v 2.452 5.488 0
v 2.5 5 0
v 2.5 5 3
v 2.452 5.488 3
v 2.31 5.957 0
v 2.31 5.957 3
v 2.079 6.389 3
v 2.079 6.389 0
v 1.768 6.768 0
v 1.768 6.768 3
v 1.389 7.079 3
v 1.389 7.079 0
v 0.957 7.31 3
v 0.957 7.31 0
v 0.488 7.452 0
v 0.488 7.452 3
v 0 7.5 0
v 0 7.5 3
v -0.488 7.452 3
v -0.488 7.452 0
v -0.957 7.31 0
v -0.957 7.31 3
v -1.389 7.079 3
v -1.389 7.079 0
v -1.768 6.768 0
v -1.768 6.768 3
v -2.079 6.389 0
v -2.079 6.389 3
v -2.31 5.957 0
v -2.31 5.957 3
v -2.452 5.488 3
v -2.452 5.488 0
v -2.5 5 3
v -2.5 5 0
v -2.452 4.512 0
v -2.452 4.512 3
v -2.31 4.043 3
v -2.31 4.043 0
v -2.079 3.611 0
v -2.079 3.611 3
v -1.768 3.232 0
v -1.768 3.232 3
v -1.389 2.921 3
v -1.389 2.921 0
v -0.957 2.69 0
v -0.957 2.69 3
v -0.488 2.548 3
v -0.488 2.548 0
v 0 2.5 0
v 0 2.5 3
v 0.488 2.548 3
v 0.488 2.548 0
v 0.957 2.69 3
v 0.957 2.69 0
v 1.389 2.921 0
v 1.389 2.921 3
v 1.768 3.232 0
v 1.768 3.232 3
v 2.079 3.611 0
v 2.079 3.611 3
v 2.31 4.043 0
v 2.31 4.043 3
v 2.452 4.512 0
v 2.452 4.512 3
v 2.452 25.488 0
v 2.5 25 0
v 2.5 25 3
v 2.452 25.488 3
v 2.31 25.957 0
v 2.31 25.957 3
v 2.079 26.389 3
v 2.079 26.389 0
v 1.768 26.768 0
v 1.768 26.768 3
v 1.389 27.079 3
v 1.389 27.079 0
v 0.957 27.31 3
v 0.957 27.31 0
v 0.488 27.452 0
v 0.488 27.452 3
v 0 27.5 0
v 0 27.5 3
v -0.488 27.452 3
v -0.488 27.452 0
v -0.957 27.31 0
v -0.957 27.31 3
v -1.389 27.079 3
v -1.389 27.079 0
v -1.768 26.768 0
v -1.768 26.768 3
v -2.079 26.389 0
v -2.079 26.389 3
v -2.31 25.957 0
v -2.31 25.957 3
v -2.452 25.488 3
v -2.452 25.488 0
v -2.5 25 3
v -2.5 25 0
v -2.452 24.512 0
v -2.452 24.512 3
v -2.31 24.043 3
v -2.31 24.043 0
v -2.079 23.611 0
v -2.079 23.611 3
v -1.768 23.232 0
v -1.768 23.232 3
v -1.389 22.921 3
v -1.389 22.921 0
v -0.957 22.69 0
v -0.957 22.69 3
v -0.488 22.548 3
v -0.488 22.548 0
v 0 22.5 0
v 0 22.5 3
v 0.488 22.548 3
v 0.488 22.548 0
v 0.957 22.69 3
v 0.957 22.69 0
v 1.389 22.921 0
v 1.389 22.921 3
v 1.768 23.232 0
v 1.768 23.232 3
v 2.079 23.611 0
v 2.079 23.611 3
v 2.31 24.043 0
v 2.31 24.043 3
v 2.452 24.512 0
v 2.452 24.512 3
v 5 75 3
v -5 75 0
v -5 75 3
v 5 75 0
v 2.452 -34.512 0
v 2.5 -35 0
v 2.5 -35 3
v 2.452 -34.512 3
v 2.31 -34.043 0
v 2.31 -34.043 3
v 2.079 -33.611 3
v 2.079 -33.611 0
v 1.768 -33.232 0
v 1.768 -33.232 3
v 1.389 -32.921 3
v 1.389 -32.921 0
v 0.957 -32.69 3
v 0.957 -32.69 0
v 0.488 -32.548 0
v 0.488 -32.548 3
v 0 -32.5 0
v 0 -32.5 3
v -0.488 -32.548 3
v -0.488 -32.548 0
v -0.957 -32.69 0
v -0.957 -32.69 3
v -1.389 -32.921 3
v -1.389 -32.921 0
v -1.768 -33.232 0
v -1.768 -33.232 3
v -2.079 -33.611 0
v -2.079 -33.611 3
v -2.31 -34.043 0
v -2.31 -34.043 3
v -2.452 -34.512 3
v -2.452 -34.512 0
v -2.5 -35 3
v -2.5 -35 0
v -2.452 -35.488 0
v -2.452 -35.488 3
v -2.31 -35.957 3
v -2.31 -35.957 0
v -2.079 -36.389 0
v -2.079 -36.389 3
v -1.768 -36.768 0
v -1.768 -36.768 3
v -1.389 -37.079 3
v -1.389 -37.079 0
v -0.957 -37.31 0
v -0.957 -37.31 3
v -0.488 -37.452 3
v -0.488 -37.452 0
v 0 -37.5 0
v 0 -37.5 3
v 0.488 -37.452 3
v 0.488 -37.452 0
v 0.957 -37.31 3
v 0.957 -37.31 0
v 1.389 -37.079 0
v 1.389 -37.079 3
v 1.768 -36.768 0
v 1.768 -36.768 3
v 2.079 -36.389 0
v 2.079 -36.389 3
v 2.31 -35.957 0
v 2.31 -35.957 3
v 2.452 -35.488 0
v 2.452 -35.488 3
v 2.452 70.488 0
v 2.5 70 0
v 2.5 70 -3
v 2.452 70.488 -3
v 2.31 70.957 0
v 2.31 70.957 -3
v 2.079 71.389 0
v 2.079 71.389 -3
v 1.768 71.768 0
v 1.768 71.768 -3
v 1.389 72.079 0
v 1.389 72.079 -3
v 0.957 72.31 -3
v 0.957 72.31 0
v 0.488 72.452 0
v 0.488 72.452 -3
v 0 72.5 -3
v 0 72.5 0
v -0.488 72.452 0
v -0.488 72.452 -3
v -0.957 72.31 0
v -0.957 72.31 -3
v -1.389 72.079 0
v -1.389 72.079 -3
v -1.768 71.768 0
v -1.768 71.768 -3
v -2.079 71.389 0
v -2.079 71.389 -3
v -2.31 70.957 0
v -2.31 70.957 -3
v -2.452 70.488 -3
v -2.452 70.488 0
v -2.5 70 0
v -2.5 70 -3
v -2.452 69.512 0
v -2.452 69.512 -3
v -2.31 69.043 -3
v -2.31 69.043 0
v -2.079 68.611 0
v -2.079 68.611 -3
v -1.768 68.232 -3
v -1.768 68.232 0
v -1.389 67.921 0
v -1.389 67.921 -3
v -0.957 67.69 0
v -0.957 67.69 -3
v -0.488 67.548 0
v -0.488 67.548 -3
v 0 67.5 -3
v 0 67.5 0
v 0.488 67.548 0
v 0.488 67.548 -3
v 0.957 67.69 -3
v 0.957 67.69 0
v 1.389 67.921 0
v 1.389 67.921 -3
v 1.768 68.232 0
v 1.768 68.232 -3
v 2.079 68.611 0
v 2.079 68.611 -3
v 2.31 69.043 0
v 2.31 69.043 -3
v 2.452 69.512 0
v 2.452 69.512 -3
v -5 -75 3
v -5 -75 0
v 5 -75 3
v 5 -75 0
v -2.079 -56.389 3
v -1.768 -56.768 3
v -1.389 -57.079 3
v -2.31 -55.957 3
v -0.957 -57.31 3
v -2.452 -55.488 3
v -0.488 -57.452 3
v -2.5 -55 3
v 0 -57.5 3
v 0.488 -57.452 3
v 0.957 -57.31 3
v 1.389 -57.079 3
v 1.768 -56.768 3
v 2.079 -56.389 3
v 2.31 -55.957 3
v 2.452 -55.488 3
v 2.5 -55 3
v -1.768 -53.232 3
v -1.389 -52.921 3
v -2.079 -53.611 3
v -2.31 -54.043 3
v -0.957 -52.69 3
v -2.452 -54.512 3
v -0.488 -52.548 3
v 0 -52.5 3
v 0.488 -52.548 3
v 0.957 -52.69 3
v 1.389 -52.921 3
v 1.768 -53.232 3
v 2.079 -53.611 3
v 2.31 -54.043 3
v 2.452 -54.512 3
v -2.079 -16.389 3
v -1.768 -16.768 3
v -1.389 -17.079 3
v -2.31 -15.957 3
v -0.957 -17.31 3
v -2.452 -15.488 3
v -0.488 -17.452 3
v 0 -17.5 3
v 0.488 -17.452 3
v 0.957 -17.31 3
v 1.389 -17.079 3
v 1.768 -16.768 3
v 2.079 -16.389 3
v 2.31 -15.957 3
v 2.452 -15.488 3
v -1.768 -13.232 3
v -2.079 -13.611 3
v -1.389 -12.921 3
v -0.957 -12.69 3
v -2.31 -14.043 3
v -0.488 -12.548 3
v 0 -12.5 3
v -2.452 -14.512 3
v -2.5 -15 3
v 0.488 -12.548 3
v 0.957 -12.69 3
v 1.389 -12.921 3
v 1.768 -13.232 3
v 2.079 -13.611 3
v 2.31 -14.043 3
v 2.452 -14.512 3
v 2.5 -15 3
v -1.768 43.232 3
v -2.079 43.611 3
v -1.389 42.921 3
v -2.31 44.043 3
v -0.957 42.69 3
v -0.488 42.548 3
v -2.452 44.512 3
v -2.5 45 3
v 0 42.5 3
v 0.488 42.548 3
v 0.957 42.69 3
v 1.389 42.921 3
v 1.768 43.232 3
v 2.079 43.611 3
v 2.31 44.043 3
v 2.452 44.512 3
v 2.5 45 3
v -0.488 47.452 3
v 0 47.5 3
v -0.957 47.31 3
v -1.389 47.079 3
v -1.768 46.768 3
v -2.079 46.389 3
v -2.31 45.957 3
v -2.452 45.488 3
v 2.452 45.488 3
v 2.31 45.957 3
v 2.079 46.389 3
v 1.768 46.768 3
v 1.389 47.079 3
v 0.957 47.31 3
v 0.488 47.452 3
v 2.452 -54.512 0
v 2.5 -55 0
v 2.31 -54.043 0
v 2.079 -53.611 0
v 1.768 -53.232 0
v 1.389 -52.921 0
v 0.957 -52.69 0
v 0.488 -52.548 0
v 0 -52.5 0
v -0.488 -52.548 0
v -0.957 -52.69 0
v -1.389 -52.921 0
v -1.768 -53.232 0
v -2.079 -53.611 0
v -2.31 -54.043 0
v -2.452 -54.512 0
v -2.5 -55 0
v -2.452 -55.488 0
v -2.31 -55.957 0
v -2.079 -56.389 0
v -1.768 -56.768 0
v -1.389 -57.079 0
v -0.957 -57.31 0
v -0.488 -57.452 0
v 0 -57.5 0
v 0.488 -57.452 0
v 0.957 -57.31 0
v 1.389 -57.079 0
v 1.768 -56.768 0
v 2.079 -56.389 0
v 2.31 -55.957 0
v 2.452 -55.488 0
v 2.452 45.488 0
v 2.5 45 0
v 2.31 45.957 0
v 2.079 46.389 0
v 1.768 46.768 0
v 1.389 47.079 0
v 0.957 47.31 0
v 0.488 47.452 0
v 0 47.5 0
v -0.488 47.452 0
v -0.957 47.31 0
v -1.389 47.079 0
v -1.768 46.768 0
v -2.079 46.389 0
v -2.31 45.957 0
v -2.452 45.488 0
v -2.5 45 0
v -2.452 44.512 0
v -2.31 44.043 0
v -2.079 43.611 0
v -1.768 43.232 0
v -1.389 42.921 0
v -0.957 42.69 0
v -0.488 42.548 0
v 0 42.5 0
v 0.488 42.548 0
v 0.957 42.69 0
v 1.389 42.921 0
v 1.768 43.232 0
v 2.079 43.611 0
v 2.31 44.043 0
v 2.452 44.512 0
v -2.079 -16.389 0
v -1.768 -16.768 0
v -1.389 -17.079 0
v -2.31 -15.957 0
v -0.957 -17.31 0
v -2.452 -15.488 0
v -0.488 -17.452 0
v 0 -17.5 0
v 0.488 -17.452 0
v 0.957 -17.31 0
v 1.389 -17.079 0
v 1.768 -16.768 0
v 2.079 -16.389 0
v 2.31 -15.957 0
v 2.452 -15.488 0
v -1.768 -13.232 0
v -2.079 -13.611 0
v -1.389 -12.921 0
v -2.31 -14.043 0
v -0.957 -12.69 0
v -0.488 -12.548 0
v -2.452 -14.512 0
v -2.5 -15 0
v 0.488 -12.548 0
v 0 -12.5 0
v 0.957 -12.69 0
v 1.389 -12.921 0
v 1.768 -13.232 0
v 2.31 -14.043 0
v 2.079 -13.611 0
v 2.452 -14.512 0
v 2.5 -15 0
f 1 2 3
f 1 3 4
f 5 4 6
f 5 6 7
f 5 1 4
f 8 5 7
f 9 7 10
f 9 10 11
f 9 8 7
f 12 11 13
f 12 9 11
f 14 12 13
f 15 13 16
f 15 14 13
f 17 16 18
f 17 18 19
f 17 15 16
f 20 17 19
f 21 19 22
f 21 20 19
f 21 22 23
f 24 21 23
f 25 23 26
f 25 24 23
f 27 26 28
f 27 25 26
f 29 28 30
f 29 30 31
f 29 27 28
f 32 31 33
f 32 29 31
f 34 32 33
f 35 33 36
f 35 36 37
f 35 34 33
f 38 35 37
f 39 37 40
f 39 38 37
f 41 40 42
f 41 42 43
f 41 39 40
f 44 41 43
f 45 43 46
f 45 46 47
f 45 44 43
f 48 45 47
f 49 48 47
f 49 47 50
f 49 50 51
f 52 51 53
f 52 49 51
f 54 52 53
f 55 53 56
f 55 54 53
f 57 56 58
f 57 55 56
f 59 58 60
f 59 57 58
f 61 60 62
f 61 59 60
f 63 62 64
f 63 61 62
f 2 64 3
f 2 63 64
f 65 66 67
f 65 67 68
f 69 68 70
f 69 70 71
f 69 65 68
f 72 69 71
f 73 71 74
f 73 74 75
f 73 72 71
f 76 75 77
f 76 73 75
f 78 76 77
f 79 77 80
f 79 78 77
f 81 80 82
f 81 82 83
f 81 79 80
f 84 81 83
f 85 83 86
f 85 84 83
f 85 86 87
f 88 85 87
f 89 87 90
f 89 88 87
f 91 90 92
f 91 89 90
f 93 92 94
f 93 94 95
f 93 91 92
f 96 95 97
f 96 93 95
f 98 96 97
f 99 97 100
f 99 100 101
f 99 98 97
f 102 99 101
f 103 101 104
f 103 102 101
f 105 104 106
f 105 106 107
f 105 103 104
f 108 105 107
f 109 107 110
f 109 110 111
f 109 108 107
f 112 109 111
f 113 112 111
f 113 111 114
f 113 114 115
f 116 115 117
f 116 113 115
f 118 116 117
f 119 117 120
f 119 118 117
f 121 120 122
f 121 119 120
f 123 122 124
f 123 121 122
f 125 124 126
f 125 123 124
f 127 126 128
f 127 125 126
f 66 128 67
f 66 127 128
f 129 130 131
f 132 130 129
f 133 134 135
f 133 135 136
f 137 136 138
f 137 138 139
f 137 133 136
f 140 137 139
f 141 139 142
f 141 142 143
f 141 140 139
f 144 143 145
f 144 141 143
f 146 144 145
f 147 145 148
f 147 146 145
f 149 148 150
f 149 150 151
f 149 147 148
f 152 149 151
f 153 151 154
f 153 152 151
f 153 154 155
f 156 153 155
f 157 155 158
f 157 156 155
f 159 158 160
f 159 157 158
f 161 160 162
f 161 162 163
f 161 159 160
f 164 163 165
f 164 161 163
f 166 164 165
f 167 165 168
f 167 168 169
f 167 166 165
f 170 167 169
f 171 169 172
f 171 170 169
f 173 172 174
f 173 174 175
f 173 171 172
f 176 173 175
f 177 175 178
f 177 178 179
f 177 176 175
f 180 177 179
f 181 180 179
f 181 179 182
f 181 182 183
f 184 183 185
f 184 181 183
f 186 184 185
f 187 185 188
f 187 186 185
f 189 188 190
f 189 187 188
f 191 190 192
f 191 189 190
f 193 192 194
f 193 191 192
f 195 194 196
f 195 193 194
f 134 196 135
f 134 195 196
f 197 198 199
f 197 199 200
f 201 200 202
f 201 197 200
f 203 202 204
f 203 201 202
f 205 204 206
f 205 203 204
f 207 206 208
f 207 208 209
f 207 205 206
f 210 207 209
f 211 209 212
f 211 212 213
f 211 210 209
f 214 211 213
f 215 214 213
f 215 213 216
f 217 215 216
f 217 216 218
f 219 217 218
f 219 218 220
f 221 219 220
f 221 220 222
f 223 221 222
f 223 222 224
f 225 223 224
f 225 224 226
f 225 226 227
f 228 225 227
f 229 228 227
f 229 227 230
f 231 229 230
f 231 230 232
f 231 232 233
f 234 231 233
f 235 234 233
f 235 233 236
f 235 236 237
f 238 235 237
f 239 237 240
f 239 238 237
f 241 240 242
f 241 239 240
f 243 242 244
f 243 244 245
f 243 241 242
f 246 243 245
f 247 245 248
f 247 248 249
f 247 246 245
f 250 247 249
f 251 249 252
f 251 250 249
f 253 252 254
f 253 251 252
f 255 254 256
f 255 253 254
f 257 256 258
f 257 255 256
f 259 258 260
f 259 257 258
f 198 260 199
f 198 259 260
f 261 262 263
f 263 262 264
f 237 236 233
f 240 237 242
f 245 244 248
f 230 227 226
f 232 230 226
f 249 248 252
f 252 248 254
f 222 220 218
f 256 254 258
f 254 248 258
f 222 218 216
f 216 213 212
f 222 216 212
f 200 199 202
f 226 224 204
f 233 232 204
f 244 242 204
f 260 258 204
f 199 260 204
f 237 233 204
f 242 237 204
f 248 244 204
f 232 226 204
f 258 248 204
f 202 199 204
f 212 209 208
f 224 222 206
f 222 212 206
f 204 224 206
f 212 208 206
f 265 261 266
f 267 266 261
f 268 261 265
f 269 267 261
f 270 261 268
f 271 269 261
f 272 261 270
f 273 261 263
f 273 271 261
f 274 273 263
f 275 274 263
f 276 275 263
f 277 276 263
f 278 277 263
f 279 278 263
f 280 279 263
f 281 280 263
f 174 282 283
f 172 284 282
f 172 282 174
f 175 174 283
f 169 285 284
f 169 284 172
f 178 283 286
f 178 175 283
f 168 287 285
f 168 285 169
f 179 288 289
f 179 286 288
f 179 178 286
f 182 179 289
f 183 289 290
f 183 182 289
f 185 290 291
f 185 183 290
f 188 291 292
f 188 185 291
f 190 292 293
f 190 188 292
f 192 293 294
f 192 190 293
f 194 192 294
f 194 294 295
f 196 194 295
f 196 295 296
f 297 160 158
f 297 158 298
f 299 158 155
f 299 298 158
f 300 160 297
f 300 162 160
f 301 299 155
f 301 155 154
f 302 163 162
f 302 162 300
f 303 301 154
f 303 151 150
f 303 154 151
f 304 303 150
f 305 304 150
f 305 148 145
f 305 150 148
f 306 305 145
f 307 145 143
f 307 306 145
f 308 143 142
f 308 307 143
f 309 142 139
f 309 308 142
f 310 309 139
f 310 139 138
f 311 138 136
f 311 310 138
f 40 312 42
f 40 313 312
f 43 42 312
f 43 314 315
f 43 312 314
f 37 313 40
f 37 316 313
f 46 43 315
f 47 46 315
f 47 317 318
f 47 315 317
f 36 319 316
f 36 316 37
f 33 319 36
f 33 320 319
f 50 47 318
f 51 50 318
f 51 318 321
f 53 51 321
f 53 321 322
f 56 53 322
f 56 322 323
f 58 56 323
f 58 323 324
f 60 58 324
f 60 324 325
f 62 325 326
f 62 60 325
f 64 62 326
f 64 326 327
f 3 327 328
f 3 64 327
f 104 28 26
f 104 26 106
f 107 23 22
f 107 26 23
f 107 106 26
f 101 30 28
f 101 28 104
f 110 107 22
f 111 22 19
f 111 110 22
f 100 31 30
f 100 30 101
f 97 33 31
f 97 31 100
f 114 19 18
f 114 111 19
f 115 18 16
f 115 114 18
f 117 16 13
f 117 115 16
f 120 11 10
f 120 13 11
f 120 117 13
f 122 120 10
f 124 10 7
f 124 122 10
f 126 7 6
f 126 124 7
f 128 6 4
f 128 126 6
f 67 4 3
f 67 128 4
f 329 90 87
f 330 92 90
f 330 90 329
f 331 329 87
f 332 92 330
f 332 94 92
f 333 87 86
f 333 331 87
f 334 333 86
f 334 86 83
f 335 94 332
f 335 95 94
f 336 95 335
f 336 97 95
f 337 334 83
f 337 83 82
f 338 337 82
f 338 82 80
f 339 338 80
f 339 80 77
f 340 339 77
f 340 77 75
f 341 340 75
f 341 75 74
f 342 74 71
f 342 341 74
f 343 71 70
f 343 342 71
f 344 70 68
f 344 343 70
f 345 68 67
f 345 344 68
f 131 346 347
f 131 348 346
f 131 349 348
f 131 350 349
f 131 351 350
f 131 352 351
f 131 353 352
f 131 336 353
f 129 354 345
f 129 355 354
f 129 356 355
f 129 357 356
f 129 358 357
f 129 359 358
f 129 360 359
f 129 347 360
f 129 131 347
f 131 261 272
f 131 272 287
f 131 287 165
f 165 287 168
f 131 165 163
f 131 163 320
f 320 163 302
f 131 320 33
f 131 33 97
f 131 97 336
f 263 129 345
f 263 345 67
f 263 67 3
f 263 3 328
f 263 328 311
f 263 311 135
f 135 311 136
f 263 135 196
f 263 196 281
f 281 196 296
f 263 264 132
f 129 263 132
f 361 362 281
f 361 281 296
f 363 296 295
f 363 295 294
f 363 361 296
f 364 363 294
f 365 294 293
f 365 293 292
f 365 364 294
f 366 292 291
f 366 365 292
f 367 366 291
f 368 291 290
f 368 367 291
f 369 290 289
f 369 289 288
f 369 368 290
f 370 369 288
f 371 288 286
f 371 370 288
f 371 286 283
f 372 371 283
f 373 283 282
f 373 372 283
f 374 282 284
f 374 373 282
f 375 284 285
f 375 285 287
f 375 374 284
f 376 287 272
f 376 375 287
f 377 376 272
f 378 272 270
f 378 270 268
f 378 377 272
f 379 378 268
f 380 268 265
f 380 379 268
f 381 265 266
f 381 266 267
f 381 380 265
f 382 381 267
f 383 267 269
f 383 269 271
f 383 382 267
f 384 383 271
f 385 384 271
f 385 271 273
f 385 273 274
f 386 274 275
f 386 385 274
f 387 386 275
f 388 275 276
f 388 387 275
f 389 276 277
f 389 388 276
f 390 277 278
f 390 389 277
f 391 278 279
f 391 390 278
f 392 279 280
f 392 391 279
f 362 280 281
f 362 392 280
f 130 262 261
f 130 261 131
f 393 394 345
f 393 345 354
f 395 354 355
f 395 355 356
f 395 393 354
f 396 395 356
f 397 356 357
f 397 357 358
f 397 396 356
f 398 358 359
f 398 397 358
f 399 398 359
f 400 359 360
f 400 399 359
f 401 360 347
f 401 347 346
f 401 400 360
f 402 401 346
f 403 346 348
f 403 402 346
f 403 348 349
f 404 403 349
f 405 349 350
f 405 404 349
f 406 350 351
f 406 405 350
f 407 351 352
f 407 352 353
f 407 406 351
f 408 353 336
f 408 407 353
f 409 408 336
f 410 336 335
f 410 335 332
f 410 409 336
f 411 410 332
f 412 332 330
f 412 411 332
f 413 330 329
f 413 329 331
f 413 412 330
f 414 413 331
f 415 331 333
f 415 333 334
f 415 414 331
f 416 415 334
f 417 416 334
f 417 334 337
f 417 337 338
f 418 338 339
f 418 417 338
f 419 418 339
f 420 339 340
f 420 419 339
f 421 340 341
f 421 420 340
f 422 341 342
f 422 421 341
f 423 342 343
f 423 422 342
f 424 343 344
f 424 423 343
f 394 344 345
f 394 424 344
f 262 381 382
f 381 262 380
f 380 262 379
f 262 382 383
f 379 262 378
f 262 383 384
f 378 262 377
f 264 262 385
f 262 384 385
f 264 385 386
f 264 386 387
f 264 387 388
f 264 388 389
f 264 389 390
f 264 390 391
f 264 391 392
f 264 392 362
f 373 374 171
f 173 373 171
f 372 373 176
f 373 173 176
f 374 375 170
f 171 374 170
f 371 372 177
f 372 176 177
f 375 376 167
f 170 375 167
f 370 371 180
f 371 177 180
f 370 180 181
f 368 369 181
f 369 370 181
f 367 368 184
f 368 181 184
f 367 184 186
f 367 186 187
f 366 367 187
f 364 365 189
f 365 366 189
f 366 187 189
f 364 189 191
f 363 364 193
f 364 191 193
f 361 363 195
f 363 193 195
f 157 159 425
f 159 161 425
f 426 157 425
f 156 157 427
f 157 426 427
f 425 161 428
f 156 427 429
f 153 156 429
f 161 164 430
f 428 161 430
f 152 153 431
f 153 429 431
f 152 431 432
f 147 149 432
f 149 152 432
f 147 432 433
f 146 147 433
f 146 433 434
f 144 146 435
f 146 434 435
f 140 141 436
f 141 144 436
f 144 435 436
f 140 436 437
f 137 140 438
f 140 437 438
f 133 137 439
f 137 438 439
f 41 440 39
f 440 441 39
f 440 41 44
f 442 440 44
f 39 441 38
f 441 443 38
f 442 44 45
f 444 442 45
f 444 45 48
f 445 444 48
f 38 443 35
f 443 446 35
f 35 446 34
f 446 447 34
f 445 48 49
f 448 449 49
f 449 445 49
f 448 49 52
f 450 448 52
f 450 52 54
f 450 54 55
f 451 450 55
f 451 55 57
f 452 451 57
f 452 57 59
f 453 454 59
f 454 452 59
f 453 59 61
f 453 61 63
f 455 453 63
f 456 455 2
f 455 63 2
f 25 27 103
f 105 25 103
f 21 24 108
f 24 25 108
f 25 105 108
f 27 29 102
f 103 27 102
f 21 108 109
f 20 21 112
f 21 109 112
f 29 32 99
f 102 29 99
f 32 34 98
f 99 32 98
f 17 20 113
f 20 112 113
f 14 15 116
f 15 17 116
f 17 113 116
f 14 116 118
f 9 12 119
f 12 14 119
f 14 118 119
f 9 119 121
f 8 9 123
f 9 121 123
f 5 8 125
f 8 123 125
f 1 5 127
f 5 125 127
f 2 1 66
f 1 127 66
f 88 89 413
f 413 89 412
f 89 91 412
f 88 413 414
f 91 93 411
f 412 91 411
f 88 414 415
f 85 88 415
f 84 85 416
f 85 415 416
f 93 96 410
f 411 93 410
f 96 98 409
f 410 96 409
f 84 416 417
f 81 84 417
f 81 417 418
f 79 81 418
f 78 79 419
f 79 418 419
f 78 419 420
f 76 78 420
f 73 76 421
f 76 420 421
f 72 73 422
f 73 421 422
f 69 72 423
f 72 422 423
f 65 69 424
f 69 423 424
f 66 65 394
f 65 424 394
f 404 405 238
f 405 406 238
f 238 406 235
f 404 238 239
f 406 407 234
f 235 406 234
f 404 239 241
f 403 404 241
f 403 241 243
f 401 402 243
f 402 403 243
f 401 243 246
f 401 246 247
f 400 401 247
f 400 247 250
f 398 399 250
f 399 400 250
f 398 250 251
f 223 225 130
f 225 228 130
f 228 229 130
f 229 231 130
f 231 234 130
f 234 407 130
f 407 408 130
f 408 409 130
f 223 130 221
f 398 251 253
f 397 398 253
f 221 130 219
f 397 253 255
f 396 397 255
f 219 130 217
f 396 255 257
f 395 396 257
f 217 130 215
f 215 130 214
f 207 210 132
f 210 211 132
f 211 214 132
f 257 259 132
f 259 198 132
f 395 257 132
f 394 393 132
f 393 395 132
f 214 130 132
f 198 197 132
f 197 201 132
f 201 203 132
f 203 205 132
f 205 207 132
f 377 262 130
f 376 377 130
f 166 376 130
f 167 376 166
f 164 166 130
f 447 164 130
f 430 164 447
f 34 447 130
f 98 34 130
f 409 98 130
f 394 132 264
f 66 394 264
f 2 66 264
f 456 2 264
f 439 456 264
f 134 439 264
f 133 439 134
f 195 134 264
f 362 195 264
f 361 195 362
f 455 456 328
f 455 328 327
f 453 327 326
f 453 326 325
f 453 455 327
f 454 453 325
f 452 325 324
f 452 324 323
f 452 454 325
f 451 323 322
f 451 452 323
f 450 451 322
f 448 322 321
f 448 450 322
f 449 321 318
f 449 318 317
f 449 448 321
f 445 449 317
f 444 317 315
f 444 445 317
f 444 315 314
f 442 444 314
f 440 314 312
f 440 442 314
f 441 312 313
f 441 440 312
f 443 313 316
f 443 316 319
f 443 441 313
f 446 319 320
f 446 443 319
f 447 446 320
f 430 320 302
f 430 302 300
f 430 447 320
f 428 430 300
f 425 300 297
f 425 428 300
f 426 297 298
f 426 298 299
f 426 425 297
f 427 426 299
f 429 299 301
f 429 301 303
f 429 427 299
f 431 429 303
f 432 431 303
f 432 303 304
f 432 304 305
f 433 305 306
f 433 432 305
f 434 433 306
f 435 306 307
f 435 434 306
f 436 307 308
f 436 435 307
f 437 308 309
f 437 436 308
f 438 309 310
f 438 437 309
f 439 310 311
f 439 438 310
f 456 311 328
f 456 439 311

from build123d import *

# Parameters (mm, degrees)
SKETCH_1_W      = 10
SKETCH_1_H      = 150
SKETCH_1_R      = 2.5
EXTRUDE_1_DEPTH = 3
SKETCH_2_R      = 2.5
EXTRUDE_2_DEPTH = 6


with BuildPart() as part:
    # 草圖1 → 填料-伸長1 (new body)
    with BuildSketch(Plane.XY):
        Rectangle(SKETCH_1_W, SKETCH_1_H)
        with Locations((0, -55)):
            Circle(SKETCH_1_R, mode=Mode.SUBTRACT)
        with Locations((0, -35)):
            Circle(SKETCH_1_R, mode=Mode.SUBTRACT)
        with Locations((0, -15)):
            Circle(SKETCH_1_R, mode=Mode.SUBTRACT)
        with Locations((0, 5)):
            Circle(SKETCH_1_R, mode=Mode.SUBTRACT)
        with Locations((0, 25)):
            Circle(SKETCH_1_R, mode=Mode.SUBTRACT)
        with Locations((0, 45)):
            Circle(SKETCH_1_R, mode=Mode.SUBTRACT)
    extrude(amount=EXTRUDE_1_DEPTH)

    # 草圖2 → 填料-伸長2 (add)
    with BuildSketch(Plane.XY.offset(3)):
        with Locations((0, 70)):
            Circle(SKETCH_2_R)
    extrude(amount=-EXTRUDE_2_DEPTH)


solid = part.part
